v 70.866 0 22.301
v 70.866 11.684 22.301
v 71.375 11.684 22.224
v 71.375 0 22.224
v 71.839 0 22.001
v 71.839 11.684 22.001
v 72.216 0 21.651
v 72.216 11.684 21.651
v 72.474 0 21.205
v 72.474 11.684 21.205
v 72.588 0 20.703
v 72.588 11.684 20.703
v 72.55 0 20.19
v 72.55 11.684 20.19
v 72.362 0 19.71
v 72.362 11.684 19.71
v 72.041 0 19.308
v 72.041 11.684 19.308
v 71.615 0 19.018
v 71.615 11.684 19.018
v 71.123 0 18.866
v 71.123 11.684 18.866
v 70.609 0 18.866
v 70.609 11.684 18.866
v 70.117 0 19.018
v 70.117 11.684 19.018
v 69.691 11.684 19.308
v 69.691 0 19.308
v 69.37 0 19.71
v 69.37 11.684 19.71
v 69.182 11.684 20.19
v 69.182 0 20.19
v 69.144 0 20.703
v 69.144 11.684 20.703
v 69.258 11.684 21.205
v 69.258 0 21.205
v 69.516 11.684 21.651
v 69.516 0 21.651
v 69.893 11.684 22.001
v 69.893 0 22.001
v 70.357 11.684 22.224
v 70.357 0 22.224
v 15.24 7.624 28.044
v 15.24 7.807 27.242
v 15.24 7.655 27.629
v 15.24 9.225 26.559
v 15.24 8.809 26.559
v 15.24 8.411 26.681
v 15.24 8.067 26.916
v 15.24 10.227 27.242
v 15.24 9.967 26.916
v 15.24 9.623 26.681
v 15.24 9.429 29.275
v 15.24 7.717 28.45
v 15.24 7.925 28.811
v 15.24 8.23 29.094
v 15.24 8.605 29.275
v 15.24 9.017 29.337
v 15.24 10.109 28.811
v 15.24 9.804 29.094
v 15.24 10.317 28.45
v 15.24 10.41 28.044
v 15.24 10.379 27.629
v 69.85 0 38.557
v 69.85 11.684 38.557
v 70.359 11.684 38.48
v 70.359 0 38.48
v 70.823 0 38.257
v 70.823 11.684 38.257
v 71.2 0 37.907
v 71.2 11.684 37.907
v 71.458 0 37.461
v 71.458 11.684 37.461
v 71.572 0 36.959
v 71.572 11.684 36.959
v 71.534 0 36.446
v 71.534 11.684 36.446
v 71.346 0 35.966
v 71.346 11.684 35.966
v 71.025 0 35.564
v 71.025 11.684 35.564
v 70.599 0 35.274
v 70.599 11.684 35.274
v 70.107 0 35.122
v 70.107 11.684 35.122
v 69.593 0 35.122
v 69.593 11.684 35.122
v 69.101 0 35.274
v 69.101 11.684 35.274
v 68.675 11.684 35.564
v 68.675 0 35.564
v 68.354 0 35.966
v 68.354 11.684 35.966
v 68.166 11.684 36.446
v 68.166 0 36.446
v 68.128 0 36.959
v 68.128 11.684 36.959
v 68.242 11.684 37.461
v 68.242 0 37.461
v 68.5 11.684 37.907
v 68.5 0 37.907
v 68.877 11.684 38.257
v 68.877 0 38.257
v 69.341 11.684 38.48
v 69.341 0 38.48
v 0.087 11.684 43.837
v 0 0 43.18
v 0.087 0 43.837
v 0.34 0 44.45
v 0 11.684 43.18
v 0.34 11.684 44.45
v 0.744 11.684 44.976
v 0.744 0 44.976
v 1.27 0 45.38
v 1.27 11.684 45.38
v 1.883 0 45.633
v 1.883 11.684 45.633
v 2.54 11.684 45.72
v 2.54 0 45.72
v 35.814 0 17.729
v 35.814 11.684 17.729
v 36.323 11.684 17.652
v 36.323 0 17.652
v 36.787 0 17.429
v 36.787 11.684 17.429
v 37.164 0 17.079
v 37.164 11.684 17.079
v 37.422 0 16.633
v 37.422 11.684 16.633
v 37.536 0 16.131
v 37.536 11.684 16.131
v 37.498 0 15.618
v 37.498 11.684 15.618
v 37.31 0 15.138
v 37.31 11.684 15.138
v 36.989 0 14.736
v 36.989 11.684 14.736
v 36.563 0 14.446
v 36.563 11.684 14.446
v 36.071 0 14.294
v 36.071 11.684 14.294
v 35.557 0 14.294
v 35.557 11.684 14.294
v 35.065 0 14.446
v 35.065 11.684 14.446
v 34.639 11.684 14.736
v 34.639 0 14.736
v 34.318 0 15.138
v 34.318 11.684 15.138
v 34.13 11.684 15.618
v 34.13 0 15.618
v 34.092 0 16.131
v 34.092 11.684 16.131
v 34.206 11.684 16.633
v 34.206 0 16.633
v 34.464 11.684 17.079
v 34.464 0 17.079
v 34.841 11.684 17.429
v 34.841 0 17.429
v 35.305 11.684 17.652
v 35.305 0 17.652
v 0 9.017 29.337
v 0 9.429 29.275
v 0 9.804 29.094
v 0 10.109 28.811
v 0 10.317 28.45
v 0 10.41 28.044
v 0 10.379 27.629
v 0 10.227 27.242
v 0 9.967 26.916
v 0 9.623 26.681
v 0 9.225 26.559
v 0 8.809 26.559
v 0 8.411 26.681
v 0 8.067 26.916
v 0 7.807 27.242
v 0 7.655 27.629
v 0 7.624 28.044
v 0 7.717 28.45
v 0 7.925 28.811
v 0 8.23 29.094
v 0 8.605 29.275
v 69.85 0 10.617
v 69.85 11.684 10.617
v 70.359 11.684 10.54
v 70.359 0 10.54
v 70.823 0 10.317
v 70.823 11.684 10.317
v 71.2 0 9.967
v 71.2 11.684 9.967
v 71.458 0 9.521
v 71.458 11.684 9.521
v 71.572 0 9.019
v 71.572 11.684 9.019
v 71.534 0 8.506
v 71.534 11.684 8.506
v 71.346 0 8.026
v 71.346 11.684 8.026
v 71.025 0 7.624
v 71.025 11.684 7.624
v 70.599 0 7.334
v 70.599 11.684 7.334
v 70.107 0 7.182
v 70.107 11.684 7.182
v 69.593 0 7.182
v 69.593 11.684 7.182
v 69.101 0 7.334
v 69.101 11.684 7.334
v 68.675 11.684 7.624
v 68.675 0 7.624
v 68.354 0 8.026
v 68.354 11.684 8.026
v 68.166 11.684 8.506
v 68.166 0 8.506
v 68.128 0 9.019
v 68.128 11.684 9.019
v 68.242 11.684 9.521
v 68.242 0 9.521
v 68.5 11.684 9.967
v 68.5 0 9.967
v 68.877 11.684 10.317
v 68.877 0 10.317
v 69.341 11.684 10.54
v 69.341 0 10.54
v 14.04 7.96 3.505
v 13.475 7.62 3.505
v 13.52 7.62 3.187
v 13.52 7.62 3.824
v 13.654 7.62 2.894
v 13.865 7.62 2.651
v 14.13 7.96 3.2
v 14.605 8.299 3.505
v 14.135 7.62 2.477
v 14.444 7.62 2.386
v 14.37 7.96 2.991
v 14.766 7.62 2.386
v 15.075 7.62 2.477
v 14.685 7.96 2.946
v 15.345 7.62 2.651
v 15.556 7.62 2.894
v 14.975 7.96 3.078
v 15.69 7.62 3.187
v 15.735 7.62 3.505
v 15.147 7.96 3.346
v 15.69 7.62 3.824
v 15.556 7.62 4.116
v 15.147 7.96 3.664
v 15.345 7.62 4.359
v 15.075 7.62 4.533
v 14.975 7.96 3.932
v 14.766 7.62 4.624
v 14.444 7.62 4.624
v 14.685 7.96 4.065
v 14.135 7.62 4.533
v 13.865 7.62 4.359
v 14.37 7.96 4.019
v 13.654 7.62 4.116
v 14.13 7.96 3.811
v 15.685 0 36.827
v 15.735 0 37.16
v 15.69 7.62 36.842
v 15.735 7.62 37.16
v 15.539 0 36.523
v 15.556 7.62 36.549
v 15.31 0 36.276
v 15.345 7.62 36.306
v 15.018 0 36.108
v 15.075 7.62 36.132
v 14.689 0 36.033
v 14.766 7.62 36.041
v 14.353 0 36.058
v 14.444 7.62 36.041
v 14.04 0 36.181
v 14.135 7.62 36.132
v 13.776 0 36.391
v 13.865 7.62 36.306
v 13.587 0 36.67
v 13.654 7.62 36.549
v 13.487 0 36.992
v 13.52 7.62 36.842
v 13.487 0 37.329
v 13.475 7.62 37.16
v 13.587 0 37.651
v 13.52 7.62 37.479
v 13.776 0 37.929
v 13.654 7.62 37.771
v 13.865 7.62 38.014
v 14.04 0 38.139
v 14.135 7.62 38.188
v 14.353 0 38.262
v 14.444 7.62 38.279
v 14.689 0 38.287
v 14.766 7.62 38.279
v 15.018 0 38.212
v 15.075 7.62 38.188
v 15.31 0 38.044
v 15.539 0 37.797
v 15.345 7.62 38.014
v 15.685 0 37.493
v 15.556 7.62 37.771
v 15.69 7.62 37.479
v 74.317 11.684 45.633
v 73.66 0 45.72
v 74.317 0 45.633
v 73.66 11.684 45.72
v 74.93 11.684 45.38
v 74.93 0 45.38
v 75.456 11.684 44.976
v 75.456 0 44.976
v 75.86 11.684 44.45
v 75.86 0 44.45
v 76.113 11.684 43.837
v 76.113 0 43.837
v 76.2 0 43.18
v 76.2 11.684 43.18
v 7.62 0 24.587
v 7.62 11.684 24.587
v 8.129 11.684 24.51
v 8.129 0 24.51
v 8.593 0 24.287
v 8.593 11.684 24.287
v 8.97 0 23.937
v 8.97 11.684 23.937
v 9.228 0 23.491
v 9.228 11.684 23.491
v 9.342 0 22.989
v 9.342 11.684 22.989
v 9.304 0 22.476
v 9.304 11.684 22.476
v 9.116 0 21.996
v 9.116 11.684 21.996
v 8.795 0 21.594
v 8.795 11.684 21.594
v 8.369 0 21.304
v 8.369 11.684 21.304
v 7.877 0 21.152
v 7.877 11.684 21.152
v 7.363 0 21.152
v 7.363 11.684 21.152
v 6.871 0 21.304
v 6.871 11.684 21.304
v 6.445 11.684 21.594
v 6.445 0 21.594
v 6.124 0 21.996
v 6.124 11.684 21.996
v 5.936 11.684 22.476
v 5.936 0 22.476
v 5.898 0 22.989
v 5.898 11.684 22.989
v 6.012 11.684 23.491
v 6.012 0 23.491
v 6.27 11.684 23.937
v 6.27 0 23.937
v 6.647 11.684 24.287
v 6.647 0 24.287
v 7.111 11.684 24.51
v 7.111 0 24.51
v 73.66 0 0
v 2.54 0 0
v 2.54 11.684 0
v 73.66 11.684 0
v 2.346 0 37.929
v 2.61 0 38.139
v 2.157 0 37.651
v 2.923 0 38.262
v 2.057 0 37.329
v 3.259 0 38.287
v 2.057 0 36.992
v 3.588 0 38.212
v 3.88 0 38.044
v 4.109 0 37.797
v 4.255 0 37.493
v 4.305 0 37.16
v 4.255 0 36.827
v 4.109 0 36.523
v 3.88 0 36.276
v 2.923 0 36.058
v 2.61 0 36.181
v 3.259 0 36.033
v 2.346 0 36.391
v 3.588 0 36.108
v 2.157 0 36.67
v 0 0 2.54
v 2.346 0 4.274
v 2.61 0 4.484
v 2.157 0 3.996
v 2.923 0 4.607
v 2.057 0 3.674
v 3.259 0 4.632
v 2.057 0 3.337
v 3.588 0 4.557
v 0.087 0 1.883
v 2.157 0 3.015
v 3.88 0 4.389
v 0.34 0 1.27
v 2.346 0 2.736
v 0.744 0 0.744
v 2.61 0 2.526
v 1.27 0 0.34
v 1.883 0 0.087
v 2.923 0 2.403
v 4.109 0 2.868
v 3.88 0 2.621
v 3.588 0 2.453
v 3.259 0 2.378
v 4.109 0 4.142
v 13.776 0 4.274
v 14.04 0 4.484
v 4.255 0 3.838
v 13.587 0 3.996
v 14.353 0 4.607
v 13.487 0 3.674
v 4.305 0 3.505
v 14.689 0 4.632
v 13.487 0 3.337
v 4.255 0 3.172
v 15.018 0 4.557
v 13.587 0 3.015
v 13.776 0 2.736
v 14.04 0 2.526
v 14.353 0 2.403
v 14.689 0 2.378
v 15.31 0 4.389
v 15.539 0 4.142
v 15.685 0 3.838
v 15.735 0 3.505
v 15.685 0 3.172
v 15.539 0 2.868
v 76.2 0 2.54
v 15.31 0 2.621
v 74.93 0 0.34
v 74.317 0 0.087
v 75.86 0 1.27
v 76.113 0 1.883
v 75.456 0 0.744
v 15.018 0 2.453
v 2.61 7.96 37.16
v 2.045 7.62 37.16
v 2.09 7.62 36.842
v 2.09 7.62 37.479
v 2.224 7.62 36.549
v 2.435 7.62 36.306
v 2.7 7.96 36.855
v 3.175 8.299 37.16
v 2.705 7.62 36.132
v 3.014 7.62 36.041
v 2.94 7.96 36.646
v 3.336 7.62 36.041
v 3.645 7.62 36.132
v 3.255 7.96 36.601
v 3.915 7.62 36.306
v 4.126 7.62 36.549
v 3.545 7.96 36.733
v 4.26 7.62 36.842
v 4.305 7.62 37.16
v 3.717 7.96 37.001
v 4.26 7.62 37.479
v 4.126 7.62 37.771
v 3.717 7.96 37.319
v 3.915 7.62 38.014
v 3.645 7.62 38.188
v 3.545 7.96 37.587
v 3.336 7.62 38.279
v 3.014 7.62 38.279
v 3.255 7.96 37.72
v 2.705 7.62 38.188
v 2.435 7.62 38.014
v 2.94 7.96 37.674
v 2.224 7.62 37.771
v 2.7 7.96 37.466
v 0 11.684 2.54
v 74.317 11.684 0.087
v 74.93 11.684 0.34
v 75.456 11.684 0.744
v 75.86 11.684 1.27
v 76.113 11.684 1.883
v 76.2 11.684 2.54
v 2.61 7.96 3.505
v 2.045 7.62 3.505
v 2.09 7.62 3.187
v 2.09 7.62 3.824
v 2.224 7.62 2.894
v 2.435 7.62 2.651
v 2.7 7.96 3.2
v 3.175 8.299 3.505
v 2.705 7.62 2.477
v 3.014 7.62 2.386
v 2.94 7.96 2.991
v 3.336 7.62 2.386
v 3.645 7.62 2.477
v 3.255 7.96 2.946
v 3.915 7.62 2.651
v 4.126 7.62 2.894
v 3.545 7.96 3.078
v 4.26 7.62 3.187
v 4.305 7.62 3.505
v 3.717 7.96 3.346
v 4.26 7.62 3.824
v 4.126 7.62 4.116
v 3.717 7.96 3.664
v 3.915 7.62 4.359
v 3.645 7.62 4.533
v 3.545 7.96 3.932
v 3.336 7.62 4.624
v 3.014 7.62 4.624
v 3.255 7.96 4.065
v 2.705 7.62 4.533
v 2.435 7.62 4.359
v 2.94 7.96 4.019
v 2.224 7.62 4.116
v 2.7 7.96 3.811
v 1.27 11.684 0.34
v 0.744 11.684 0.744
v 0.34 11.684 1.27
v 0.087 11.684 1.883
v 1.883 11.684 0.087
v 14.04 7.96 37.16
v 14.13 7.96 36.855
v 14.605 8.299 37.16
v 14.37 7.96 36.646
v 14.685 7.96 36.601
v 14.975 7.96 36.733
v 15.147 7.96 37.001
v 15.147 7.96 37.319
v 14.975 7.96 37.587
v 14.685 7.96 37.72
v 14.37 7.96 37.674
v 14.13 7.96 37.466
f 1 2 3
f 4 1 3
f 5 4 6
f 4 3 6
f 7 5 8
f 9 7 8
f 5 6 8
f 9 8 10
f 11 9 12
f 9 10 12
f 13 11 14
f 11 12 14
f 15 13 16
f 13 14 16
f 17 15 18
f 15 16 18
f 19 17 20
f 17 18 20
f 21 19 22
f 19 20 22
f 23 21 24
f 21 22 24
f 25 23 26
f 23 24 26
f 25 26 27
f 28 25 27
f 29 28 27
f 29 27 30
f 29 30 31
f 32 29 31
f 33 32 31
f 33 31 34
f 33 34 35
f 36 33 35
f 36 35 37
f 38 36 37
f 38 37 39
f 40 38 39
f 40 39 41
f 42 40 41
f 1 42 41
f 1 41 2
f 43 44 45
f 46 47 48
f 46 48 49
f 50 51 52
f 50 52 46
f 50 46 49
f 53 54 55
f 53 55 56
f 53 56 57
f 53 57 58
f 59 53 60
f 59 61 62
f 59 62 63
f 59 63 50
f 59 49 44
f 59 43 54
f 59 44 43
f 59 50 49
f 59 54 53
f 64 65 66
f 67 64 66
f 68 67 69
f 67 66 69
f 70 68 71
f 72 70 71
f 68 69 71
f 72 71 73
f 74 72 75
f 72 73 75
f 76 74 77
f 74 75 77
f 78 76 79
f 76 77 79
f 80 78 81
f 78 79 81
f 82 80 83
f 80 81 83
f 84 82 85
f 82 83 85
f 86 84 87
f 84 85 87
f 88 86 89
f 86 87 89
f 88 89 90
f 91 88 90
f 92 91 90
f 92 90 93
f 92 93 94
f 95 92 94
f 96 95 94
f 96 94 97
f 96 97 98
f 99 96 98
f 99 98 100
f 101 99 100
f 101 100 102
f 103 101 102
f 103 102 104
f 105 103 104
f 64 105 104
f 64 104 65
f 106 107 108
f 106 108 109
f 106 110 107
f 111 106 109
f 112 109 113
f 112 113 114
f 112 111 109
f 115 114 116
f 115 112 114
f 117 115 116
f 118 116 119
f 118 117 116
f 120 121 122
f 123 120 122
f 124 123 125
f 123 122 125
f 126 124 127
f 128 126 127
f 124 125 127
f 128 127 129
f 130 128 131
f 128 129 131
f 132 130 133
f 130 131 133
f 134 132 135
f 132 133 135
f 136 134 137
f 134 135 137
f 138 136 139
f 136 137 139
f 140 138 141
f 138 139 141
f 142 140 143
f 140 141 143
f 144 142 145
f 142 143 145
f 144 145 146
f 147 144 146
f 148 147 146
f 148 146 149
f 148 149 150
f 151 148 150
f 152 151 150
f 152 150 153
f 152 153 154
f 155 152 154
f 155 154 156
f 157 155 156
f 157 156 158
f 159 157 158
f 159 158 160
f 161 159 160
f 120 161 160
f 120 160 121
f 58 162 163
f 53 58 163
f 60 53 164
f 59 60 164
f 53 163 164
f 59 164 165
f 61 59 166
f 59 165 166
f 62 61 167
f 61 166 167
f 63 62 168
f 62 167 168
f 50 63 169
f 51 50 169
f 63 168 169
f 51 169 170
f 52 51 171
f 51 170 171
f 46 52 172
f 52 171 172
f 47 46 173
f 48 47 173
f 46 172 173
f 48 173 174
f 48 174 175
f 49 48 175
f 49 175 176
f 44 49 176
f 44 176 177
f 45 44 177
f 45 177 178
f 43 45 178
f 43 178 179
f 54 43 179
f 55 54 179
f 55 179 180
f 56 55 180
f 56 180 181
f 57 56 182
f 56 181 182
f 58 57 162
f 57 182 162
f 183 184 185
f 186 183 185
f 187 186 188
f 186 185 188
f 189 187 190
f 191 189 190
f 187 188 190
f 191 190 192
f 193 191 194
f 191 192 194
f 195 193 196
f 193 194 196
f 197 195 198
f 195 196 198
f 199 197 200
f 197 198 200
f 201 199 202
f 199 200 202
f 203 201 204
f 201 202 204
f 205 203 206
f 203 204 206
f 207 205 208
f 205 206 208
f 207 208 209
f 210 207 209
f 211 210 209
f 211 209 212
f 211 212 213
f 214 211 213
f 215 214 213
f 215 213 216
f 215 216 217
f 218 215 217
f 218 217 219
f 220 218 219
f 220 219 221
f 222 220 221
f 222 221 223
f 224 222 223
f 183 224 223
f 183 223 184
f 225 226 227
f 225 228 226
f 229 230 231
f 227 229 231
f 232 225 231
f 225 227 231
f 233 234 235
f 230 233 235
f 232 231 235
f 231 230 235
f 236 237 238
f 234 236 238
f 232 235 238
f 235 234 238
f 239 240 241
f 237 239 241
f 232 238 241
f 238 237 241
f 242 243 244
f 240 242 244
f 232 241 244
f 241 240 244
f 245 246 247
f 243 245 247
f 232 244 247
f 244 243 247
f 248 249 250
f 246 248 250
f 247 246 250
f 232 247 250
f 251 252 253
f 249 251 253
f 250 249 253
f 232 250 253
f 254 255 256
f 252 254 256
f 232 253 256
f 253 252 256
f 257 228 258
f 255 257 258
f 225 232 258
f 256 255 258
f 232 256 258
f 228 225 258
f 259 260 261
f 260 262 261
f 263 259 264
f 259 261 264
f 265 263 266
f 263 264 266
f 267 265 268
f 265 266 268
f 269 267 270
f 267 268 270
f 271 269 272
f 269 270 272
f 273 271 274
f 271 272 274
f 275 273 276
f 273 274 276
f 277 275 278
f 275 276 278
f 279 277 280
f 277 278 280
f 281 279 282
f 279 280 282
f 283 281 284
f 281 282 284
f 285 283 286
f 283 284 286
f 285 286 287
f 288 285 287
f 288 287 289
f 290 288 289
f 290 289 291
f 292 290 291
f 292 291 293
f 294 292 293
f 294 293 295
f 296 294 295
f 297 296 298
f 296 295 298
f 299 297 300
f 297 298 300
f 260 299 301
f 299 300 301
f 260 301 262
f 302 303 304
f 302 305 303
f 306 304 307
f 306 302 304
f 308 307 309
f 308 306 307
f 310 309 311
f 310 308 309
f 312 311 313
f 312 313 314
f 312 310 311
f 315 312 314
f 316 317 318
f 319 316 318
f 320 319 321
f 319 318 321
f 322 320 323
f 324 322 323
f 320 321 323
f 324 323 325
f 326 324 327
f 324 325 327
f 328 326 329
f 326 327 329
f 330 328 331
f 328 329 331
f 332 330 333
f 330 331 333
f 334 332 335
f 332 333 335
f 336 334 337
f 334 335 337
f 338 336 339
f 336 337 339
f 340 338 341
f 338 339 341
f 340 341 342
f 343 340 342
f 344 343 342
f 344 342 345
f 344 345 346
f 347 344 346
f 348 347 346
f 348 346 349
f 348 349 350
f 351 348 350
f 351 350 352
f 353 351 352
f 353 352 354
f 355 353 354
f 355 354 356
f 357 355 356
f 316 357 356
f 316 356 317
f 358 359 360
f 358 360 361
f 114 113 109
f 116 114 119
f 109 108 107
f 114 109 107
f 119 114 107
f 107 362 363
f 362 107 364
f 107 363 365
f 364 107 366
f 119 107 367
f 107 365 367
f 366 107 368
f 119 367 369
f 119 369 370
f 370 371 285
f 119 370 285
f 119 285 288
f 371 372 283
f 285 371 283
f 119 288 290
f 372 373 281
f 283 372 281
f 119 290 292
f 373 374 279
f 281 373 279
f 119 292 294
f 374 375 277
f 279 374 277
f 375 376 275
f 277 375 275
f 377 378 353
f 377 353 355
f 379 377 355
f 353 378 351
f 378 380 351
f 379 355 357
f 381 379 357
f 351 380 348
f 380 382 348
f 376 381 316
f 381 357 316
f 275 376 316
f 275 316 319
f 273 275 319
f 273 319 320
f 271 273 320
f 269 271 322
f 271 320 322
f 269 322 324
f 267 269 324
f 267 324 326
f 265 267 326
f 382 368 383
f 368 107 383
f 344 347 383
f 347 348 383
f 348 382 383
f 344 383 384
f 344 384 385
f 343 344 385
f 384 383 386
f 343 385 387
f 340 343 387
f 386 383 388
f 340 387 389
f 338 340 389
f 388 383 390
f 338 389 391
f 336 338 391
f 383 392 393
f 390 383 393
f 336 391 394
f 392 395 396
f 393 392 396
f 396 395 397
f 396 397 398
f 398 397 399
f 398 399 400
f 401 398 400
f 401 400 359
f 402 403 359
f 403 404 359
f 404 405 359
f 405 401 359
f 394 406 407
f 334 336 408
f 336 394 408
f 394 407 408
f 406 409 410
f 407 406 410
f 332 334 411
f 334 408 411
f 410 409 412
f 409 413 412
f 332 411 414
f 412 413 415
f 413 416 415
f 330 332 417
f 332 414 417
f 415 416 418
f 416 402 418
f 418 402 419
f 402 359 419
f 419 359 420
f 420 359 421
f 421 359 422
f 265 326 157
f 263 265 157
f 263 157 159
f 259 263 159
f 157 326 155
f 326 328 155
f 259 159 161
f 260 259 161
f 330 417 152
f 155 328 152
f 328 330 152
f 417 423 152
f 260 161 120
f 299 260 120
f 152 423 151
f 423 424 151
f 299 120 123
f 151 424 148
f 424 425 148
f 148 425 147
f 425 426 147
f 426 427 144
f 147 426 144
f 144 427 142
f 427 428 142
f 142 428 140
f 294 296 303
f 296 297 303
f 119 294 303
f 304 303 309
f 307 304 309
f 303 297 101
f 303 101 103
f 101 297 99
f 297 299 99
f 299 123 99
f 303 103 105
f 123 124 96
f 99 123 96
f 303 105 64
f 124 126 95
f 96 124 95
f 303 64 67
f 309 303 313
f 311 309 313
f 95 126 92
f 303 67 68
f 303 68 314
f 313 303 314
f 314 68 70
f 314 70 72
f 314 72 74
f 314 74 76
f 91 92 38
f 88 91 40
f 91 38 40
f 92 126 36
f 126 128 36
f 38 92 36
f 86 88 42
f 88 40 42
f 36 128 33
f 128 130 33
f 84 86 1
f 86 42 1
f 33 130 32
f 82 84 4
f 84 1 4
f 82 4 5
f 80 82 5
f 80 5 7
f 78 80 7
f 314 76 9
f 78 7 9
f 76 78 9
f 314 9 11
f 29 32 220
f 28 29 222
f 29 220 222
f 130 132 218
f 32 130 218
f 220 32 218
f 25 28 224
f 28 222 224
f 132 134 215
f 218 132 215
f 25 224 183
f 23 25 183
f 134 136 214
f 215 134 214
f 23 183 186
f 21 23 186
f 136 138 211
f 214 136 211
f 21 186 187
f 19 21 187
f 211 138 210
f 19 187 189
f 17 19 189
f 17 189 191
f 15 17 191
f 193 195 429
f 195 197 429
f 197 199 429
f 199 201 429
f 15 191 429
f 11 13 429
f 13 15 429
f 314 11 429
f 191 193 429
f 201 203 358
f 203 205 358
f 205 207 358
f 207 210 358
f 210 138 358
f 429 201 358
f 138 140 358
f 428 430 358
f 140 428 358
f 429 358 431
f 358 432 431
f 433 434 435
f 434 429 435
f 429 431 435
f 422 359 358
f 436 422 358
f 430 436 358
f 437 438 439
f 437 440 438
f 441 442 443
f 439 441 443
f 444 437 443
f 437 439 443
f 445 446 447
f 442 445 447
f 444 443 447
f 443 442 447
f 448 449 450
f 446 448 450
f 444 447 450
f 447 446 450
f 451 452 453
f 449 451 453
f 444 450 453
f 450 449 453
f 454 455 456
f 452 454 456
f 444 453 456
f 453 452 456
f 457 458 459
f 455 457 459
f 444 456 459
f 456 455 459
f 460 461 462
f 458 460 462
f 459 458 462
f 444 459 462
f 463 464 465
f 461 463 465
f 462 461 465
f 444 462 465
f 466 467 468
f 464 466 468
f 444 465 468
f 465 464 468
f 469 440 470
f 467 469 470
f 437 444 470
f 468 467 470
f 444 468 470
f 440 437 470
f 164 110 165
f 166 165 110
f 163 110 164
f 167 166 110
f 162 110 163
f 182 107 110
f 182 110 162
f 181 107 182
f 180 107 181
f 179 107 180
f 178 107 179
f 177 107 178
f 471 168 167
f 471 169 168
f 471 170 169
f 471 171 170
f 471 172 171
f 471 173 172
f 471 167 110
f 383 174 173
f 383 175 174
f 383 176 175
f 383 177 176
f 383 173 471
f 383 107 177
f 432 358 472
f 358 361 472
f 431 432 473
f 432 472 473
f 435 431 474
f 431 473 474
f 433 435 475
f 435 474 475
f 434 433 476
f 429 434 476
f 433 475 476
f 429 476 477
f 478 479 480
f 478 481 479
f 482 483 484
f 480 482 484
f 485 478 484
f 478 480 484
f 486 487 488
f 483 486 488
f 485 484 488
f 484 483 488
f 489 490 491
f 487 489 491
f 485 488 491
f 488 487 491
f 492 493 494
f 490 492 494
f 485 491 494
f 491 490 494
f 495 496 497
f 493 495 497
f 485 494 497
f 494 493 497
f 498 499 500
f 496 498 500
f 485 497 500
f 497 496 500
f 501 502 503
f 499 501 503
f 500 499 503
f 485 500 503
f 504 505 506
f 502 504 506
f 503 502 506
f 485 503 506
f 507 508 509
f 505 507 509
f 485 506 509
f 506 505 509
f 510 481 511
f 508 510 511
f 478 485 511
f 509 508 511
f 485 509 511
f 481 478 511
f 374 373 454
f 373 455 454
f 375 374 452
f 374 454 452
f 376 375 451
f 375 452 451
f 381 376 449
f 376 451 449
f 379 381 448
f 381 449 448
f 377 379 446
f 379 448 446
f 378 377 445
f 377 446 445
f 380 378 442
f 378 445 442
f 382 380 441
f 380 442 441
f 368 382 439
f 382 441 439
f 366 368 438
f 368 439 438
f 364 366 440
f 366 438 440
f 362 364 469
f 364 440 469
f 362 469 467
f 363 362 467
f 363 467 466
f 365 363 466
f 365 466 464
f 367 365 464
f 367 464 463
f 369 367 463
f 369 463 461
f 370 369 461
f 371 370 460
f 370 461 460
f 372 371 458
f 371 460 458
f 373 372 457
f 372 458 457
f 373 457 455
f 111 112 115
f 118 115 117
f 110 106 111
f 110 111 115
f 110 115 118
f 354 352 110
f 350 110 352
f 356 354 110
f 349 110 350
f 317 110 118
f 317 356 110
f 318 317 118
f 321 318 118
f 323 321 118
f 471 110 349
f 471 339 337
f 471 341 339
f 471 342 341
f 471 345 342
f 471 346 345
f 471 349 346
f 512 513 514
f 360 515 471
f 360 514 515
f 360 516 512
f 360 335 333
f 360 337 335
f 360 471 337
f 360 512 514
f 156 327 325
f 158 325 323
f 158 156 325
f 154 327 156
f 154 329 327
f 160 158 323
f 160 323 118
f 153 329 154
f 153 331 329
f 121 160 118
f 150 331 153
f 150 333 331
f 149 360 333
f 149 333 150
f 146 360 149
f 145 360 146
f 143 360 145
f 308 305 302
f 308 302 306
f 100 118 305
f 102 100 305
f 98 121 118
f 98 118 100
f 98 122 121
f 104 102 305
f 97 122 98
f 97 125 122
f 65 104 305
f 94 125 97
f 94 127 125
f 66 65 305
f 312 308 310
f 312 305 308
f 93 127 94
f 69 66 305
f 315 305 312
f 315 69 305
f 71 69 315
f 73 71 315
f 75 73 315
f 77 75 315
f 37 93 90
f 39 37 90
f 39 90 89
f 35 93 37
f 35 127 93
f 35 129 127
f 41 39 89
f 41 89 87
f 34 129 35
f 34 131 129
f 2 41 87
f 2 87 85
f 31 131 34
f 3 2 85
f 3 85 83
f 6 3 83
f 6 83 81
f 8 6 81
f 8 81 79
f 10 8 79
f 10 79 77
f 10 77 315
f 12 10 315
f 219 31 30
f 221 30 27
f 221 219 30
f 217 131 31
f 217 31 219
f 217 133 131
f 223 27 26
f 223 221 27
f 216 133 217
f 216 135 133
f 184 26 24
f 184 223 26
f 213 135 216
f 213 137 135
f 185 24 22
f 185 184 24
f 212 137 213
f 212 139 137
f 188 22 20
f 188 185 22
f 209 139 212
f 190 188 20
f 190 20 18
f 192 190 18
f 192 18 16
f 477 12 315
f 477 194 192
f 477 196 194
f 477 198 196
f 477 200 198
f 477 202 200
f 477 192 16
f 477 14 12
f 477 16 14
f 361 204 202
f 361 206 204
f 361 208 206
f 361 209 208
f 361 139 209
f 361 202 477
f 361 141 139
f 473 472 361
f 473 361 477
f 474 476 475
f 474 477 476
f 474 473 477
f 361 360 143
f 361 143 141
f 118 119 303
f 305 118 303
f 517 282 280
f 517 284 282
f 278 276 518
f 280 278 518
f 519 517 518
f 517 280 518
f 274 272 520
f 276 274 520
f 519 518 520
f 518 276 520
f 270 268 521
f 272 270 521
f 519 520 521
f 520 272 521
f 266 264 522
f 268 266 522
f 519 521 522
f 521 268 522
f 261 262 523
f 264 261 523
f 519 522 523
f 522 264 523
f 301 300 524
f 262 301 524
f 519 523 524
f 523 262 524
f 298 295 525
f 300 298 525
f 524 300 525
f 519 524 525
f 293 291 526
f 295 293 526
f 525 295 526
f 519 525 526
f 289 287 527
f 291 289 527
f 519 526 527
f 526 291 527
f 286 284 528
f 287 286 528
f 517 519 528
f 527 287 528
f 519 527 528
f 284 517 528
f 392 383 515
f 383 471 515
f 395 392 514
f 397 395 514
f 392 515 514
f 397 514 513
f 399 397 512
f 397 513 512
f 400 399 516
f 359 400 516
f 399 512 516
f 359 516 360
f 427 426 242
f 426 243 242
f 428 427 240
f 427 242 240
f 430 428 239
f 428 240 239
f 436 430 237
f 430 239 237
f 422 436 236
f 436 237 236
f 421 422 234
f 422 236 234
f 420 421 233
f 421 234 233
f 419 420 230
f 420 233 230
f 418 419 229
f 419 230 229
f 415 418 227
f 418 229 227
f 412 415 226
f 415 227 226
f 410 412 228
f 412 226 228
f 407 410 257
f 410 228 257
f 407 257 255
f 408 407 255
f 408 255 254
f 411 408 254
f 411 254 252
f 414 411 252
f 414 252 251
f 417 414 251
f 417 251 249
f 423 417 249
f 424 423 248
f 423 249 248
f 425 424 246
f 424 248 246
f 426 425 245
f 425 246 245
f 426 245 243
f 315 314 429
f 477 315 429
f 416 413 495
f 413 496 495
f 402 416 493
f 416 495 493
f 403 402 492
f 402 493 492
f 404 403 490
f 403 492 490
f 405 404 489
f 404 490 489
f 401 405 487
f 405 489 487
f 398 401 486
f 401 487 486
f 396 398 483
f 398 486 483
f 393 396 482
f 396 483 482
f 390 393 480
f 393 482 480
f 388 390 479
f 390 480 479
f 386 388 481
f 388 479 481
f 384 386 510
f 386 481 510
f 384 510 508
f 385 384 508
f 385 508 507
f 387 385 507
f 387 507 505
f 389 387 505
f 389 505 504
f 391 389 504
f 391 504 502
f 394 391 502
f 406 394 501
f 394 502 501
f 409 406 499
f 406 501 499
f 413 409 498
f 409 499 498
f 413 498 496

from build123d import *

# Parameters (mm, degrees)
SKETCH2_W                 = 76.2
SKETCH2_H                 = 45.72
BOSS_EXTRUDE3_DEPTH       = 11.684
SKETCH6_R                 = 1.7272
CUT_EXTRUDE2_DEPTH        = 90.628534831
SKETCH7_R                 = 1.7272
CUT_EXTRUDE3_DEPTH        = 90.628534831
SKETCH8_R                 = 1.7272
CUT_EXTRUDE4_DEPTH        = 90.628534831
SKETCH9_R                 = 1.397
CUT_EXTRUDE5_DEPTH        = 15.24
F_4_40_TAPPED_HOLE1_D     = 2.2606
F_4_40_TAPPED_HOLE1_DEPTH = 7.62
F_4_40_TAPPED_HOLE1_TIP   = 0.679152758
F_8_32_TAPPED_HOLE1_D     = 3.4544
F_8_32_TAPPED_HOLE1_DEPTH = 12.446
F_8_32_TAPPED_HOLE1_TIP   = 1.037806461
F_8_32_TAPPED_HOLE2_D     = 3.4544
F_8_32_TAPPED_HOLE2_DEPTH = 12.446
F_8_32_TAPPED_HOLE2_TIP   = 1.037806461
FILLET1_R                 = 2.54


with BuildPart() as part:
    # Sketch2 → Boss-Extrude3 (new body)
    with BuildSketch(Plane(origin=(0, 0, 0), x_dir=(1, 0, 0), z_dir=(0, 1, 0))):
        with Locations((38.1, -22.86)):
            Rectangle(SKETCH2_W, SKETCH2_H)
    extrude(amount=BOSS_EXTRUDE3_DEPTH)

    # Sketch6 → Cut-Extrude2 (cut, through all)
    with BuildSketch(Plane(origin=(0, 11.684, 0), x_dir=(1, 0, 0), z_dir=(0, 1, 0))):
        with Locations(Location((7.62, -22.86, 0), (0, 0, 270))):
            Circle(SKETCH6_R)
    extrude(amount=-CUT_EXTRUDE2_DEPTH, mode=Mode.SUBTRACT)

    # Sketch7 → Cut-Extrude3 (cut, through all)
    with BuildSketch(Plane(origin=(0, 11.684, 0), x_dir=(1, 0, 0), z_dir=(0, 1, 0))):
        with Locations(Location((69.85, -8.89, 0), (0, 0, 270))):
            Circle(SKETCH7_R)
    extrude(amount=-CUT_EXTRUDE3_DEPTH, mode=Mode.SUBTRACT)

    # Sketch8 → Cut-Extrude4 (cut, through all)
    with BuildSketch(Plane(origin=(0, 11.684, 0), x_dir=(1, 0, 0), z_dir=(0, 1, 0))):
        with Locations(Location((69.85, -36.83, 0), (0, 0, 270))):
            Circle(SKETCH8_R)
    extrude(amount=-CUT_EXTRUDE4_DEPTH, mode=Mode.SUBTRACT)

    # Sketch9 → Cut-Extrude5 (cut)
    with BuildSketch(Plane.ZY):
        with Locations((27.94, 9.017)):
            Circle(SKETCH9_R)
    extrude(amount=-CUT_EXTRUDE5_DEPTH, mode=Mode.SUBTRACT)

    # #4-40 Tapped Hole1
    with Locations(Plane(origin=(0, 0, 0), x_dir=(-1, 0, 0), z_dir=(0, -1, 0))):
        with Locations((-3.175, -3.5052), (-3.175, -37.1602), (-14.605, -3.5052), (-14.605, -37.1602)):
            Hole(F_4_40_TAPPED_HOLE1_D / 2, depth=F_4_40_TAPPED_HOLE1_DEPTH)
            with Locations((0, 0, -(F_4_40_TAPPED_HOLE1_DEPTH + F_4_40_TAPPED_HOLE1_TIP / 2))):  # 118° drill point
                Cone(0, F_4_40_TAPPED_HOLE1_D / 2, F_4_40_TAPPED_HOLE1_TIP, mode=Mode.SUBTRACT)

    # #8-32 Tapped Hole1
    with Locations(Plane(origin=(70.866, 0, 20.574), x_dir=(0, 0, -1), z_dir=(0, -1, 0))):
        with Locations((0, 0)):
            Hole(F_8_32_TAPPED_HOLE1_D / 2, depth=F_8_32_TAPPED_HOLE1_DEPTH)
            with Locations((0, 0, -(F_8_32_TAPPED_HOLE1_DEPTH + F_8_32_TAPPED_HOLE1_TIP / 2))):  # 118° drill point
                Cone(0, F_8_32_TAPPED_HOLE1_D / 2, F_8_32_TAPPED_HOLE1_TIP, mode=Mode.SUBTRACT)

    # #8-32 Tapped Hole2
    with Locations(Plane(origin=(35.814, 0, 16.002), x_dir=(0, 0, -1), z_dir=(0, -1, 0))):
        with Locations((0, 0)):
            Hole(F_8_32_TAPPED_HOLE2_D / 2, depth=F_8_32_TAPPED_HOLE2_DEPTH)
            with Locations((0, 0, -(F_8_32_TAPPED_HOLE2_DEPTH + F_8_32_TAPPED_HOLE2_TIP / 2))):  # 118° drill point
                Cone(0, F_8_32_TAPPED_HOLE2_D / 2, F_8_32_TAPPED_HOLE2_TIP, mode=Mode.SUBTRACT)

    # Fillet1
    fillet1_edges = [part.edges().sort_by_distance(p)[0] for p in [
        (0, 5.842, 0),
        (76.2, 5.842, 0),
        (76.2, 5.842, 45.72),
        (0, 5.842, 45.72),
    ]]
    fillet(fillet1_edges, radius=FILLET1_R)


solid = part.part
